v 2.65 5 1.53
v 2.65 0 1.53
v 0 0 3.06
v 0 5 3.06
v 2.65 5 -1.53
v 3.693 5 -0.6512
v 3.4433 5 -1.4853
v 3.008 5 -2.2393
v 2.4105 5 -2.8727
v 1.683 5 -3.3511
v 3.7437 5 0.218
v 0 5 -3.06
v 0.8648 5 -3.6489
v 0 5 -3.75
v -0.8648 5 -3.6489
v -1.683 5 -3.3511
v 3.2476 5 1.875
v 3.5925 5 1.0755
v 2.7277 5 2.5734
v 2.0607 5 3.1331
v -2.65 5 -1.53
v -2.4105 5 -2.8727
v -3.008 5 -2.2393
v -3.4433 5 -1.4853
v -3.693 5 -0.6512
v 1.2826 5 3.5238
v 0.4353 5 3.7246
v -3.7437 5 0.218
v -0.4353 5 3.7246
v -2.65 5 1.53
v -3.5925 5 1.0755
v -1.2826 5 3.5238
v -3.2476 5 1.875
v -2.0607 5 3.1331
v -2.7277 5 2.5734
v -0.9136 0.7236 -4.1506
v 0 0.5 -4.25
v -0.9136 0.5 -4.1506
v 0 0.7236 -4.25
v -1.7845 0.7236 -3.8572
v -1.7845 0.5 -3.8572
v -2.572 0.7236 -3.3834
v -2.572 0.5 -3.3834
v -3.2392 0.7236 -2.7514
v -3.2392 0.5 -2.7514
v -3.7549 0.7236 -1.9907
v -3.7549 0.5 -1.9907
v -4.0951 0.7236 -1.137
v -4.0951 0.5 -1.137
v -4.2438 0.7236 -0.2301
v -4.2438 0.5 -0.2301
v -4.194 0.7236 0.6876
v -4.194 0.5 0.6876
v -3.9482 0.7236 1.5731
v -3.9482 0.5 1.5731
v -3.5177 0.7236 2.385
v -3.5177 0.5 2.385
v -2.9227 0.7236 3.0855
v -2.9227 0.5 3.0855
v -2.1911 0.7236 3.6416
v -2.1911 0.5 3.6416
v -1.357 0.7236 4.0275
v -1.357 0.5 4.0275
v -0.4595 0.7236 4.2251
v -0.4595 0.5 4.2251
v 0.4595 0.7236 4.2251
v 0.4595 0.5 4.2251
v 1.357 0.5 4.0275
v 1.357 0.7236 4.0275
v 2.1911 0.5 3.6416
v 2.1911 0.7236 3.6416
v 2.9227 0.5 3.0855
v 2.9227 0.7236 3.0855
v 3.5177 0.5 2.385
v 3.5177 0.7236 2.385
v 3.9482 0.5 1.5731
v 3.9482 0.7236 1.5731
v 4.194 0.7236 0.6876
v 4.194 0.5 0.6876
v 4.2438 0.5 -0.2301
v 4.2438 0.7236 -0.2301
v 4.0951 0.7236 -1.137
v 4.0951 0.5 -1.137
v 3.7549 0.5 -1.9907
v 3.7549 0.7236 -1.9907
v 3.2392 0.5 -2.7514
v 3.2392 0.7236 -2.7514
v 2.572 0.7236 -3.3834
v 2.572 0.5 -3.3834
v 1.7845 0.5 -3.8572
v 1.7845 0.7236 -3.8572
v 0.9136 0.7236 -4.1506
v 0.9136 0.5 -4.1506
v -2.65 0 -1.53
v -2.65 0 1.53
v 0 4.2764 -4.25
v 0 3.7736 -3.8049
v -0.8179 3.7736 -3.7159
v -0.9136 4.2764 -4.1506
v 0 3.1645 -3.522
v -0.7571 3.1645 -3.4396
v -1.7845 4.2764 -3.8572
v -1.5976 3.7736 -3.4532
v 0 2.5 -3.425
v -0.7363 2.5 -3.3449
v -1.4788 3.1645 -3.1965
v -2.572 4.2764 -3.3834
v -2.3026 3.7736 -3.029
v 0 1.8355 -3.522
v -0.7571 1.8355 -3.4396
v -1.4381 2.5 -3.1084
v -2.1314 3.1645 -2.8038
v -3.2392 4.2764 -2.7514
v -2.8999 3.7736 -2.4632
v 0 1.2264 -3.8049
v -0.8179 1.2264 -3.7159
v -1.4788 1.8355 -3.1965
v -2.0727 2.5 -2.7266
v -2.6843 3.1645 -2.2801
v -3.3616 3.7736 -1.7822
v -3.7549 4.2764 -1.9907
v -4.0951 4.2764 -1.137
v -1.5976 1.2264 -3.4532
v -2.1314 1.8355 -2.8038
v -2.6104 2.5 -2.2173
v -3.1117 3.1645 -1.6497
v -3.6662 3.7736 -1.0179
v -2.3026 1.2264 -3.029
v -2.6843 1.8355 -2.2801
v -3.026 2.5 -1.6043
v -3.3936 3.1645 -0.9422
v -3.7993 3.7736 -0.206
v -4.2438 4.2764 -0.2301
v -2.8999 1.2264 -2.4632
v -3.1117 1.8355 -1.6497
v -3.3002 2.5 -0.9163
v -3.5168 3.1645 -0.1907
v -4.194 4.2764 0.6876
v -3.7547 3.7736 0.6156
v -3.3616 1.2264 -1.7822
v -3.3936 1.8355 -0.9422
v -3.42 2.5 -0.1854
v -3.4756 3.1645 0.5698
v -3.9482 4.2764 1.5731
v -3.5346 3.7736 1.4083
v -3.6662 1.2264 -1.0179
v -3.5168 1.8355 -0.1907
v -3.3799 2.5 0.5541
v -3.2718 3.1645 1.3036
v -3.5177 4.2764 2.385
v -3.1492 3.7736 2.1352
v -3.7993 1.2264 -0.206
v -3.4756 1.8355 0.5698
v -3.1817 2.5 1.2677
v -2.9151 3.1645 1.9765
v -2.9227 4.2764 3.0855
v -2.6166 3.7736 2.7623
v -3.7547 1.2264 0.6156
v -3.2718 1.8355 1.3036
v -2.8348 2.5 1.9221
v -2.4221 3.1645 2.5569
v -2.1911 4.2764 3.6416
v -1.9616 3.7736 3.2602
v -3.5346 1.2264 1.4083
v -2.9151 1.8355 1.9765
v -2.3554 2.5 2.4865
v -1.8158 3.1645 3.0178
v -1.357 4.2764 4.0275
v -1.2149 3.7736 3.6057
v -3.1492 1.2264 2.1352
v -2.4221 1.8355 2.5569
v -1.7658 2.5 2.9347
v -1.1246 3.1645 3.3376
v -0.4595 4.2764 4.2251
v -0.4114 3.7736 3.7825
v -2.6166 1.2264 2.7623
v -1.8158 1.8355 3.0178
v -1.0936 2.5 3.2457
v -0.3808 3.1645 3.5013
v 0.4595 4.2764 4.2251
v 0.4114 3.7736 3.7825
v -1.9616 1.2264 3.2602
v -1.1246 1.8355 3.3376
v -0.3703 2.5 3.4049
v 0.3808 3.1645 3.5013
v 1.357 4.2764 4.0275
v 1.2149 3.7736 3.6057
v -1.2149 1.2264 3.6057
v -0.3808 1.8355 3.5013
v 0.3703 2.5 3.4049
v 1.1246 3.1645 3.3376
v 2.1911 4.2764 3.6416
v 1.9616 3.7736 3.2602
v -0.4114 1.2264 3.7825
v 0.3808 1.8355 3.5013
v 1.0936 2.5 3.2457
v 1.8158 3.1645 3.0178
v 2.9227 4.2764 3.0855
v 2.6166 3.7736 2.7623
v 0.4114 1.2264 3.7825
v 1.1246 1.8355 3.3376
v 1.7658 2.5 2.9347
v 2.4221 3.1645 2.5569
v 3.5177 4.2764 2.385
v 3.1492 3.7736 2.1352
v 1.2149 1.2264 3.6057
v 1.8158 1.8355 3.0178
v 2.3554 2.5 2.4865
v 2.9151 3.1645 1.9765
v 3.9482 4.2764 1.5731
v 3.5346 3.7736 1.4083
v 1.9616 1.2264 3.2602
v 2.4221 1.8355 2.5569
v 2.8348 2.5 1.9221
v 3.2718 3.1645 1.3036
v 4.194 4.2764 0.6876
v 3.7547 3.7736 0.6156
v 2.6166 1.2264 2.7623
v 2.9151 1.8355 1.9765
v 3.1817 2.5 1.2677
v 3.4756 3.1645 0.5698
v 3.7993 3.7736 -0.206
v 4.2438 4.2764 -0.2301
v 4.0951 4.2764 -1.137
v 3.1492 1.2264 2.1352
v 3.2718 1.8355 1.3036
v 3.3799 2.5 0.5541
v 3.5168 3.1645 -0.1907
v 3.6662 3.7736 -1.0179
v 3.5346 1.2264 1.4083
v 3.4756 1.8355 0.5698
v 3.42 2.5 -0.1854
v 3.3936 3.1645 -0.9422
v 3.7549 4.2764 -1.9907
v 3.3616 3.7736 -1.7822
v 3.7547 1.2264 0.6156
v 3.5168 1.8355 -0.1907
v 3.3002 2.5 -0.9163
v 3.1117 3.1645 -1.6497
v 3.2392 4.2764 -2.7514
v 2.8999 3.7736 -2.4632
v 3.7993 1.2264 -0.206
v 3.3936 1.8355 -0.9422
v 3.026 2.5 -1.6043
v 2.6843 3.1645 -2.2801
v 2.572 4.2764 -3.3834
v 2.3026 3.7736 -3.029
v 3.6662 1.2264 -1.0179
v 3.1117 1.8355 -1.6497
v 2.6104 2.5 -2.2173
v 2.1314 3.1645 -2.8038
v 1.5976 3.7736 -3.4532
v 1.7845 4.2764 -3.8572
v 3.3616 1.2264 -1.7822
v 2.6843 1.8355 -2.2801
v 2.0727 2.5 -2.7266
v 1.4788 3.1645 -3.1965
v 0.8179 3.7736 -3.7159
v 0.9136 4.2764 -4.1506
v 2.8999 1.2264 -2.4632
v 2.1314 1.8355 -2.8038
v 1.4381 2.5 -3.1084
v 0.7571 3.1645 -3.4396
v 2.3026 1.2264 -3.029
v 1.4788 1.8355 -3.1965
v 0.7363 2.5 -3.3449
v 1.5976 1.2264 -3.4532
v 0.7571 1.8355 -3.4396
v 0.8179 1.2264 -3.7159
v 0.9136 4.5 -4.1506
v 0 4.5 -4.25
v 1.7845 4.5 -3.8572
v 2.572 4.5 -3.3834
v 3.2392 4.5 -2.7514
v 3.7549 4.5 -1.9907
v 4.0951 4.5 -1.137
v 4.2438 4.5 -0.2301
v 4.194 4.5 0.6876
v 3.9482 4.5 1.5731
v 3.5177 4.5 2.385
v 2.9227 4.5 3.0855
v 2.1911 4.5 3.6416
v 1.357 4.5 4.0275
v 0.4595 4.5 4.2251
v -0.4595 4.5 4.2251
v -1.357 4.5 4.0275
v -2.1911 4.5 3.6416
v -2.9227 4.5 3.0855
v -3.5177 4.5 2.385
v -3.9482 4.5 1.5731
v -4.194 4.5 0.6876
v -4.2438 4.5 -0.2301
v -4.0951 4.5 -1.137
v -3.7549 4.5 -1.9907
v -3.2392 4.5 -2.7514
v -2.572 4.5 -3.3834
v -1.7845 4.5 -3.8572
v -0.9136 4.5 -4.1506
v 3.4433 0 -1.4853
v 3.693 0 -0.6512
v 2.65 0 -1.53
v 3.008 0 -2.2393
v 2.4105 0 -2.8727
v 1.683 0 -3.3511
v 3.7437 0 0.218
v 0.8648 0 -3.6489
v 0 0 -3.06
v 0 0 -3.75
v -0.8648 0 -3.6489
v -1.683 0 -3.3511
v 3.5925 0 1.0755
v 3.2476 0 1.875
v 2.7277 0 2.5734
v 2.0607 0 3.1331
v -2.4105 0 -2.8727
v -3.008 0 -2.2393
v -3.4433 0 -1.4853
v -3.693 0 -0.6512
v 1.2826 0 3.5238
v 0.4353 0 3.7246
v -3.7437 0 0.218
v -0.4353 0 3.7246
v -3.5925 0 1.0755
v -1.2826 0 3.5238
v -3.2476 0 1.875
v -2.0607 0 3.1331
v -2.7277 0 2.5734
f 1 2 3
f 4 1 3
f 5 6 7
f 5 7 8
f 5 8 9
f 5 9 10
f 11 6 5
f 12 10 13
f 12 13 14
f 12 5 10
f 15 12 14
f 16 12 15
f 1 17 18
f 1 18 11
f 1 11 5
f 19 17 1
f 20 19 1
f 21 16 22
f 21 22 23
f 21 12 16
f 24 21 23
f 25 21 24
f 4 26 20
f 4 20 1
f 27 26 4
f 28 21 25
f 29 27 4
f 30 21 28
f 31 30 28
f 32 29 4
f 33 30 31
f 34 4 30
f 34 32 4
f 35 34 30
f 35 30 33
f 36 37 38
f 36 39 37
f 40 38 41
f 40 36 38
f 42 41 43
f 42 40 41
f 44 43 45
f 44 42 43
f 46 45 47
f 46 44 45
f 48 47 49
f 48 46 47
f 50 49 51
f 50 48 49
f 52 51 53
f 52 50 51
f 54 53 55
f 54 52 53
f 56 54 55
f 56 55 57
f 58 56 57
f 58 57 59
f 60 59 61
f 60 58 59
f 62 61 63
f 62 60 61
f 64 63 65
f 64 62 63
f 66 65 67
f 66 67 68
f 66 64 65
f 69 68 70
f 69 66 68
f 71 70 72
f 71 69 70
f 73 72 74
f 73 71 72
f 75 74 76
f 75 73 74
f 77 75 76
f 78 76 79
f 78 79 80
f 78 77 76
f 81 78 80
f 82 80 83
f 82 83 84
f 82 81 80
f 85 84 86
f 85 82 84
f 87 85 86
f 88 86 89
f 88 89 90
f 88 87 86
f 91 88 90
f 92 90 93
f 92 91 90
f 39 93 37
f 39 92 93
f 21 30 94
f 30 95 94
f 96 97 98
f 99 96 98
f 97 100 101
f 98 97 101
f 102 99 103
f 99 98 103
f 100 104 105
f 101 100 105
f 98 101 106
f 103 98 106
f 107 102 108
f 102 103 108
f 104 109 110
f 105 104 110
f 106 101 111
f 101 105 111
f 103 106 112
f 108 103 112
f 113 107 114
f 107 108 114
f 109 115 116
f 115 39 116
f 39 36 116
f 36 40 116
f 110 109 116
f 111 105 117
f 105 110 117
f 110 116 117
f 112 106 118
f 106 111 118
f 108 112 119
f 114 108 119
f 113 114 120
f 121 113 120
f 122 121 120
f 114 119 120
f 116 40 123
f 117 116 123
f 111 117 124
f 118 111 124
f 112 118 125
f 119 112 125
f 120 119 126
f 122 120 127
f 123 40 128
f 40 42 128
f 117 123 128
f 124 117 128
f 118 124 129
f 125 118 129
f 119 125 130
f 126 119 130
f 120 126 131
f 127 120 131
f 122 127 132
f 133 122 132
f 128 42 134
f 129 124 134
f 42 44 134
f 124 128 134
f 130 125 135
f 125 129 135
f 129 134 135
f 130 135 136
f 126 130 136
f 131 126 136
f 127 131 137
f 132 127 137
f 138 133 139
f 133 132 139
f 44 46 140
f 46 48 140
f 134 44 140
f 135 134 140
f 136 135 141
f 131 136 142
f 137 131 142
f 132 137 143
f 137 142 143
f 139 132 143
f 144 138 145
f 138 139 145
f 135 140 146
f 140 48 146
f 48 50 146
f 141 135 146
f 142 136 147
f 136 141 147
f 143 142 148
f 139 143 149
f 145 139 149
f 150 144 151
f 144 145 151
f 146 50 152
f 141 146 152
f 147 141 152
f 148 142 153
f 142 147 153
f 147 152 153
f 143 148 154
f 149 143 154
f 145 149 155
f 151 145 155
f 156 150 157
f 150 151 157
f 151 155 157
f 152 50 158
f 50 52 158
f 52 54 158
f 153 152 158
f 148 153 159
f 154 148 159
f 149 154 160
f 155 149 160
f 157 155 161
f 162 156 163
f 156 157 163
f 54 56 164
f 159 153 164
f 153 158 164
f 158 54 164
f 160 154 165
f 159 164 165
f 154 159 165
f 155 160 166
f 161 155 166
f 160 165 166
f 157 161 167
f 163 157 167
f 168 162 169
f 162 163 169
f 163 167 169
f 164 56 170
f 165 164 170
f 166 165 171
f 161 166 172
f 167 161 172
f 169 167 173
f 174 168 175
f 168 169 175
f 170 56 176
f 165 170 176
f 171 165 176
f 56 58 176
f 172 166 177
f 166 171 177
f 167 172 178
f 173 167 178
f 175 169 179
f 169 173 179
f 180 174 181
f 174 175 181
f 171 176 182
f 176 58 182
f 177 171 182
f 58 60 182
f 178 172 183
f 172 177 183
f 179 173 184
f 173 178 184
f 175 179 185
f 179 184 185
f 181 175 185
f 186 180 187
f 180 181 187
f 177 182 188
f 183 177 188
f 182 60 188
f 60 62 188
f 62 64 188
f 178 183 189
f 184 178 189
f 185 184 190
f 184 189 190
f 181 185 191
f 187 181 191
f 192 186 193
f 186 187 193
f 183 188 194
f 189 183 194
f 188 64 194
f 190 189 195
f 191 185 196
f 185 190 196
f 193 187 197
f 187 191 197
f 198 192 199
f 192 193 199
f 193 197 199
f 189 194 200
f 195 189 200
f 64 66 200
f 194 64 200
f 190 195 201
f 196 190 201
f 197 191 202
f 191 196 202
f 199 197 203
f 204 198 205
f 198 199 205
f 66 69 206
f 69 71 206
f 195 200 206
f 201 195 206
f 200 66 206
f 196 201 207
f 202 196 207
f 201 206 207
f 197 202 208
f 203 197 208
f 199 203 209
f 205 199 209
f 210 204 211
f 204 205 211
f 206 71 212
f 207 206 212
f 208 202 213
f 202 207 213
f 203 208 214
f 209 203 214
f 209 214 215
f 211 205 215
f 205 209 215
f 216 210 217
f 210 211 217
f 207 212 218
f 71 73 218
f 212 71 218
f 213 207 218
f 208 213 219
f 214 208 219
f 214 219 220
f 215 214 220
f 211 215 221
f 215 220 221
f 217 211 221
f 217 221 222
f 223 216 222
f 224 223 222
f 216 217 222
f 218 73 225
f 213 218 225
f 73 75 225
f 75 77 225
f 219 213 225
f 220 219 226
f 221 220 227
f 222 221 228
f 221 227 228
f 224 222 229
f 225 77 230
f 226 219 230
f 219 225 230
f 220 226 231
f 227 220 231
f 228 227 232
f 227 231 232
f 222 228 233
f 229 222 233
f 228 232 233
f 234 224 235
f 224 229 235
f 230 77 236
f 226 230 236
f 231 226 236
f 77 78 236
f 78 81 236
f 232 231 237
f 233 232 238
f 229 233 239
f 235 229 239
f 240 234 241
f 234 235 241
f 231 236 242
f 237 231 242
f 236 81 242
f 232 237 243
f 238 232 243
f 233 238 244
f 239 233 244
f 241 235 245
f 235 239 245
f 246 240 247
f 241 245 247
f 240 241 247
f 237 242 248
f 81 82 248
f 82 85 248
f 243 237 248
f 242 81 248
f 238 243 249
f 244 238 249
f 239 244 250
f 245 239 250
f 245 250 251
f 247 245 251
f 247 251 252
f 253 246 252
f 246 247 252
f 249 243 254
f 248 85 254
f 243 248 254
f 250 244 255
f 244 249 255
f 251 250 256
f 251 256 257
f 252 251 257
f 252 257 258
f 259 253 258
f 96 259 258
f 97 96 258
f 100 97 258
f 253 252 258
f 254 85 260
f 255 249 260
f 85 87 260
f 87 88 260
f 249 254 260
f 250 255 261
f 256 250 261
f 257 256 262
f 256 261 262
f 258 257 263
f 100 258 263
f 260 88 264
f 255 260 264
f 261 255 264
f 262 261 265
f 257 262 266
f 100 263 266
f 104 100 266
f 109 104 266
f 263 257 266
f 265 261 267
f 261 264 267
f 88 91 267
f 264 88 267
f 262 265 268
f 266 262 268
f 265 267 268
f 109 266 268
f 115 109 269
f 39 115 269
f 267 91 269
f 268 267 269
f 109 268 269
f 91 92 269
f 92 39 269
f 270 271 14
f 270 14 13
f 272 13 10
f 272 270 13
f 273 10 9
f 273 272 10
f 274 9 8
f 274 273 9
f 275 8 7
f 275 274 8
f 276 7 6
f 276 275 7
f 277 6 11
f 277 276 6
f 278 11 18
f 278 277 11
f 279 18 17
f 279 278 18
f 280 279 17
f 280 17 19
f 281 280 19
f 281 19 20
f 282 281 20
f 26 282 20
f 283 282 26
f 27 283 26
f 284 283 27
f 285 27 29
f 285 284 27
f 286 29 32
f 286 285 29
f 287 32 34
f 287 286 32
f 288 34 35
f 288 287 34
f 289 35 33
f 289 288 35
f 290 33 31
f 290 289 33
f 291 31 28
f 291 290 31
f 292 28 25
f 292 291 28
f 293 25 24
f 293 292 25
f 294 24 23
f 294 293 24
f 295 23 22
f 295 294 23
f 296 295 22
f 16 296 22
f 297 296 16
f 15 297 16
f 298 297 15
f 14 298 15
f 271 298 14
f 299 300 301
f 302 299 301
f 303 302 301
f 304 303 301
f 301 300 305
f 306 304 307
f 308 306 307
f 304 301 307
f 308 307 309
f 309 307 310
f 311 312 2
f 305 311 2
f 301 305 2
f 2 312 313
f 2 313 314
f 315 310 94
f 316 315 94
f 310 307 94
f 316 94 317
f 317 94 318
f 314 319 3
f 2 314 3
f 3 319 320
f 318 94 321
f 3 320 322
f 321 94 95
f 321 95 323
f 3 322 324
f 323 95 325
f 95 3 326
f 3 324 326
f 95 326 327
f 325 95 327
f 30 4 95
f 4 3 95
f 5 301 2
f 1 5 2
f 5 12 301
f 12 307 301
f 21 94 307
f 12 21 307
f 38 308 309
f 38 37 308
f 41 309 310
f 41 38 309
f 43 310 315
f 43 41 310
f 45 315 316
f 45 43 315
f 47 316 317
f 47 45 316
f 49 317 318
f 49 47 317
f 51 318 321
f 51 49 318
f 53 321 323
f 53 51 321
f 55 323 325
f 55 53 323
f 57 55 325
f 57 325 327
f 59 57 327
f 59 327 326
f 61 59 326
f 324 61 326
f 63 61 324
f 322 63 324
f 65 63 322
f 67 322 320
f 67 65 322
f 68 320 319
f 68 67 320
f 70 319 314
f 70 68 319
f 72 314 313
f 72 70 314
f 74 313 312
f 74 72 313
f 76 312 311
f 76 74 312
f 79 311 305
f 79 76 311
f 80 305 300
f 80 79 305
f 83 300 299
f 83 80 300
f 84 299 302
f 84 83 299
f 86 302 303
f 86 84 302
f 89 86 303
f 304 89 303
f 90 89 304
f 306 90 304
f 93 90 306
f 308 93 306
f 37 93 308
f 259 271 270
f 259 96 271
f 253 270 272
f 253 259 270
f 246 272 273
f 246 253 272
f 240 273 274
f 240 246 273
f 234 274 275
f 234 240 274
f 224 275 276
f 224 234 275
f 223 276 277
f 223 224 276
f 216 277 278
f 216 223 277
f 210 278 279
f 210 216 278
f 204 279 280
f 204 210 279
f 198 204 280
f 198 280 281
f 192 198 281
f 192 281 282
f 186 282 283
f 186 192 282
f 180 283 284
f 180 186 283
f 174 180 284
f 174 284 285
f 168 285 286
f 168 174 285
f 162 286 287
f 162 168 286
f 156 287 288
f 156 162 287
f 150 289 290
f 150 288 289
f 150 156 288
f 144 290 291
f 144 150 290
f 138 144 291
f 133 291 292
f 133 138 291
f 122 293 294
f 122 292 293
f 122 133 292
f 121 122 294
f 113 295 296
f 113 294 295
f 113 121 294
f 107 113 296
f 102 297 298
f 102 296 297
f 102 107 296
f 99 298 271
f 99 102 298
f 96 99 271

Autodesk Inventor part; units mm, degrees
ref_plane "YZ Plane" through (0, 0, 0) normal (1, 0, 0) x (0, 1, 0)
ref_plane "XZ Plane" through (0, 0, 0) normal (0, 1, 0) x (-1, 0, 0)
sketch "Sketch1" plane through (0, 0, 0) normal (0, 1, 0) x (-1, 0, 0)
  line L0 (2.65, -1.53) -> (0, -3.06)
  line L1 (0, -3.06) -> (-2.65, -1.53)
  line L2 (-2.65, -1.53) -> (-2.65, 1.53)
  line L3 (-2.65, 1.53) -> (0, 3.06)
  line L4 (0, 3.06) -> (2.65, 1.53)
  line L5 (2.65, 1.53) -> (2.65, -1.53)
  circle A0 centre (0, 0) radius 3.5
  dimension "d1" = 5.3
  dimension "d2" = 7
extrude "Extrusion1" add sketch "Sketch1" along normal blind 5
sketch "Sketch2" plane through (0, 0, 0) normal (1, 0, 0) x (0, 1, 0)
  line L0 (0, -3.5) -> (5, -3.5) projected
  circle A0 centre (2.5, -5.75) radius 2.325
  line L1 (5, -3.5) -> (5, 3.5) projected
  line L2 (5, -3.5) -> (5, -4.25)
  line L3 (5, -4.25) -> (4.2764, -4.25)
  line L4 (0, -3.5) -> (0, 3.5) projected
  line L5 (0, -3.5) -> (0, -4.25)
  line L6 (0, -4.25) -> (0.7236, -4.25)
  line L7 (-1, 0) -> (6, 0) projected
  point P0 (0, 0)
  point P1 (1.9142, -3.5)
  point P2 (3.0858, -3.5)
  dimension "d5" = 4.65
  dimension "d6" = 2.25
  dimension "d7" = 0.75
  dimension "d8" = 0.75
revolve "Revolution1" cut sketch "Sketch2" angle 360 about axis through (0, -10, 0) along (0, 1, 0) contours A0 L0 | L0 A0
revolve "Revolution2" add sketch "Sketch2" angle 360 about axis through (0, -10, 0) along (0, 1, 0) contours L0 A0 L6 L5 | L0 L2 L3 A0
chamfer "Chamfer1" distance 0.5 angle 45 2 edges at (0, 5, 4.25) (0, 0, 4.25)
ref_plane "Work Plane1" through (0, 2.5, 0) normal (0, 1, 0) x (1, 0, 0)
sketch "Sketch3" plane through (0, 0, 0) normal (0, -1, 0) x (1, 0, 0)
  line L0 (-2.65, -1.53) -> (0, -3.06) projected
  line L1 (-2.65, 1.53) -> (-2.65, -1.53) projected
  line L2 (0, 3.06) -> (-2.65, 1.53) projected
  line L3 (2.65, 1.53) -> (0, 3.06) projected
  line L4 (2.65, -1.53) -> (2.65, 1.53) projected
  line L5 (0, -3.06) -> (2.65, -1.53) projected
  circle A0 centre (0, 0) radius 3.75 projected
properties part number "5mm Hex Bearing Inside_3DPrint"
